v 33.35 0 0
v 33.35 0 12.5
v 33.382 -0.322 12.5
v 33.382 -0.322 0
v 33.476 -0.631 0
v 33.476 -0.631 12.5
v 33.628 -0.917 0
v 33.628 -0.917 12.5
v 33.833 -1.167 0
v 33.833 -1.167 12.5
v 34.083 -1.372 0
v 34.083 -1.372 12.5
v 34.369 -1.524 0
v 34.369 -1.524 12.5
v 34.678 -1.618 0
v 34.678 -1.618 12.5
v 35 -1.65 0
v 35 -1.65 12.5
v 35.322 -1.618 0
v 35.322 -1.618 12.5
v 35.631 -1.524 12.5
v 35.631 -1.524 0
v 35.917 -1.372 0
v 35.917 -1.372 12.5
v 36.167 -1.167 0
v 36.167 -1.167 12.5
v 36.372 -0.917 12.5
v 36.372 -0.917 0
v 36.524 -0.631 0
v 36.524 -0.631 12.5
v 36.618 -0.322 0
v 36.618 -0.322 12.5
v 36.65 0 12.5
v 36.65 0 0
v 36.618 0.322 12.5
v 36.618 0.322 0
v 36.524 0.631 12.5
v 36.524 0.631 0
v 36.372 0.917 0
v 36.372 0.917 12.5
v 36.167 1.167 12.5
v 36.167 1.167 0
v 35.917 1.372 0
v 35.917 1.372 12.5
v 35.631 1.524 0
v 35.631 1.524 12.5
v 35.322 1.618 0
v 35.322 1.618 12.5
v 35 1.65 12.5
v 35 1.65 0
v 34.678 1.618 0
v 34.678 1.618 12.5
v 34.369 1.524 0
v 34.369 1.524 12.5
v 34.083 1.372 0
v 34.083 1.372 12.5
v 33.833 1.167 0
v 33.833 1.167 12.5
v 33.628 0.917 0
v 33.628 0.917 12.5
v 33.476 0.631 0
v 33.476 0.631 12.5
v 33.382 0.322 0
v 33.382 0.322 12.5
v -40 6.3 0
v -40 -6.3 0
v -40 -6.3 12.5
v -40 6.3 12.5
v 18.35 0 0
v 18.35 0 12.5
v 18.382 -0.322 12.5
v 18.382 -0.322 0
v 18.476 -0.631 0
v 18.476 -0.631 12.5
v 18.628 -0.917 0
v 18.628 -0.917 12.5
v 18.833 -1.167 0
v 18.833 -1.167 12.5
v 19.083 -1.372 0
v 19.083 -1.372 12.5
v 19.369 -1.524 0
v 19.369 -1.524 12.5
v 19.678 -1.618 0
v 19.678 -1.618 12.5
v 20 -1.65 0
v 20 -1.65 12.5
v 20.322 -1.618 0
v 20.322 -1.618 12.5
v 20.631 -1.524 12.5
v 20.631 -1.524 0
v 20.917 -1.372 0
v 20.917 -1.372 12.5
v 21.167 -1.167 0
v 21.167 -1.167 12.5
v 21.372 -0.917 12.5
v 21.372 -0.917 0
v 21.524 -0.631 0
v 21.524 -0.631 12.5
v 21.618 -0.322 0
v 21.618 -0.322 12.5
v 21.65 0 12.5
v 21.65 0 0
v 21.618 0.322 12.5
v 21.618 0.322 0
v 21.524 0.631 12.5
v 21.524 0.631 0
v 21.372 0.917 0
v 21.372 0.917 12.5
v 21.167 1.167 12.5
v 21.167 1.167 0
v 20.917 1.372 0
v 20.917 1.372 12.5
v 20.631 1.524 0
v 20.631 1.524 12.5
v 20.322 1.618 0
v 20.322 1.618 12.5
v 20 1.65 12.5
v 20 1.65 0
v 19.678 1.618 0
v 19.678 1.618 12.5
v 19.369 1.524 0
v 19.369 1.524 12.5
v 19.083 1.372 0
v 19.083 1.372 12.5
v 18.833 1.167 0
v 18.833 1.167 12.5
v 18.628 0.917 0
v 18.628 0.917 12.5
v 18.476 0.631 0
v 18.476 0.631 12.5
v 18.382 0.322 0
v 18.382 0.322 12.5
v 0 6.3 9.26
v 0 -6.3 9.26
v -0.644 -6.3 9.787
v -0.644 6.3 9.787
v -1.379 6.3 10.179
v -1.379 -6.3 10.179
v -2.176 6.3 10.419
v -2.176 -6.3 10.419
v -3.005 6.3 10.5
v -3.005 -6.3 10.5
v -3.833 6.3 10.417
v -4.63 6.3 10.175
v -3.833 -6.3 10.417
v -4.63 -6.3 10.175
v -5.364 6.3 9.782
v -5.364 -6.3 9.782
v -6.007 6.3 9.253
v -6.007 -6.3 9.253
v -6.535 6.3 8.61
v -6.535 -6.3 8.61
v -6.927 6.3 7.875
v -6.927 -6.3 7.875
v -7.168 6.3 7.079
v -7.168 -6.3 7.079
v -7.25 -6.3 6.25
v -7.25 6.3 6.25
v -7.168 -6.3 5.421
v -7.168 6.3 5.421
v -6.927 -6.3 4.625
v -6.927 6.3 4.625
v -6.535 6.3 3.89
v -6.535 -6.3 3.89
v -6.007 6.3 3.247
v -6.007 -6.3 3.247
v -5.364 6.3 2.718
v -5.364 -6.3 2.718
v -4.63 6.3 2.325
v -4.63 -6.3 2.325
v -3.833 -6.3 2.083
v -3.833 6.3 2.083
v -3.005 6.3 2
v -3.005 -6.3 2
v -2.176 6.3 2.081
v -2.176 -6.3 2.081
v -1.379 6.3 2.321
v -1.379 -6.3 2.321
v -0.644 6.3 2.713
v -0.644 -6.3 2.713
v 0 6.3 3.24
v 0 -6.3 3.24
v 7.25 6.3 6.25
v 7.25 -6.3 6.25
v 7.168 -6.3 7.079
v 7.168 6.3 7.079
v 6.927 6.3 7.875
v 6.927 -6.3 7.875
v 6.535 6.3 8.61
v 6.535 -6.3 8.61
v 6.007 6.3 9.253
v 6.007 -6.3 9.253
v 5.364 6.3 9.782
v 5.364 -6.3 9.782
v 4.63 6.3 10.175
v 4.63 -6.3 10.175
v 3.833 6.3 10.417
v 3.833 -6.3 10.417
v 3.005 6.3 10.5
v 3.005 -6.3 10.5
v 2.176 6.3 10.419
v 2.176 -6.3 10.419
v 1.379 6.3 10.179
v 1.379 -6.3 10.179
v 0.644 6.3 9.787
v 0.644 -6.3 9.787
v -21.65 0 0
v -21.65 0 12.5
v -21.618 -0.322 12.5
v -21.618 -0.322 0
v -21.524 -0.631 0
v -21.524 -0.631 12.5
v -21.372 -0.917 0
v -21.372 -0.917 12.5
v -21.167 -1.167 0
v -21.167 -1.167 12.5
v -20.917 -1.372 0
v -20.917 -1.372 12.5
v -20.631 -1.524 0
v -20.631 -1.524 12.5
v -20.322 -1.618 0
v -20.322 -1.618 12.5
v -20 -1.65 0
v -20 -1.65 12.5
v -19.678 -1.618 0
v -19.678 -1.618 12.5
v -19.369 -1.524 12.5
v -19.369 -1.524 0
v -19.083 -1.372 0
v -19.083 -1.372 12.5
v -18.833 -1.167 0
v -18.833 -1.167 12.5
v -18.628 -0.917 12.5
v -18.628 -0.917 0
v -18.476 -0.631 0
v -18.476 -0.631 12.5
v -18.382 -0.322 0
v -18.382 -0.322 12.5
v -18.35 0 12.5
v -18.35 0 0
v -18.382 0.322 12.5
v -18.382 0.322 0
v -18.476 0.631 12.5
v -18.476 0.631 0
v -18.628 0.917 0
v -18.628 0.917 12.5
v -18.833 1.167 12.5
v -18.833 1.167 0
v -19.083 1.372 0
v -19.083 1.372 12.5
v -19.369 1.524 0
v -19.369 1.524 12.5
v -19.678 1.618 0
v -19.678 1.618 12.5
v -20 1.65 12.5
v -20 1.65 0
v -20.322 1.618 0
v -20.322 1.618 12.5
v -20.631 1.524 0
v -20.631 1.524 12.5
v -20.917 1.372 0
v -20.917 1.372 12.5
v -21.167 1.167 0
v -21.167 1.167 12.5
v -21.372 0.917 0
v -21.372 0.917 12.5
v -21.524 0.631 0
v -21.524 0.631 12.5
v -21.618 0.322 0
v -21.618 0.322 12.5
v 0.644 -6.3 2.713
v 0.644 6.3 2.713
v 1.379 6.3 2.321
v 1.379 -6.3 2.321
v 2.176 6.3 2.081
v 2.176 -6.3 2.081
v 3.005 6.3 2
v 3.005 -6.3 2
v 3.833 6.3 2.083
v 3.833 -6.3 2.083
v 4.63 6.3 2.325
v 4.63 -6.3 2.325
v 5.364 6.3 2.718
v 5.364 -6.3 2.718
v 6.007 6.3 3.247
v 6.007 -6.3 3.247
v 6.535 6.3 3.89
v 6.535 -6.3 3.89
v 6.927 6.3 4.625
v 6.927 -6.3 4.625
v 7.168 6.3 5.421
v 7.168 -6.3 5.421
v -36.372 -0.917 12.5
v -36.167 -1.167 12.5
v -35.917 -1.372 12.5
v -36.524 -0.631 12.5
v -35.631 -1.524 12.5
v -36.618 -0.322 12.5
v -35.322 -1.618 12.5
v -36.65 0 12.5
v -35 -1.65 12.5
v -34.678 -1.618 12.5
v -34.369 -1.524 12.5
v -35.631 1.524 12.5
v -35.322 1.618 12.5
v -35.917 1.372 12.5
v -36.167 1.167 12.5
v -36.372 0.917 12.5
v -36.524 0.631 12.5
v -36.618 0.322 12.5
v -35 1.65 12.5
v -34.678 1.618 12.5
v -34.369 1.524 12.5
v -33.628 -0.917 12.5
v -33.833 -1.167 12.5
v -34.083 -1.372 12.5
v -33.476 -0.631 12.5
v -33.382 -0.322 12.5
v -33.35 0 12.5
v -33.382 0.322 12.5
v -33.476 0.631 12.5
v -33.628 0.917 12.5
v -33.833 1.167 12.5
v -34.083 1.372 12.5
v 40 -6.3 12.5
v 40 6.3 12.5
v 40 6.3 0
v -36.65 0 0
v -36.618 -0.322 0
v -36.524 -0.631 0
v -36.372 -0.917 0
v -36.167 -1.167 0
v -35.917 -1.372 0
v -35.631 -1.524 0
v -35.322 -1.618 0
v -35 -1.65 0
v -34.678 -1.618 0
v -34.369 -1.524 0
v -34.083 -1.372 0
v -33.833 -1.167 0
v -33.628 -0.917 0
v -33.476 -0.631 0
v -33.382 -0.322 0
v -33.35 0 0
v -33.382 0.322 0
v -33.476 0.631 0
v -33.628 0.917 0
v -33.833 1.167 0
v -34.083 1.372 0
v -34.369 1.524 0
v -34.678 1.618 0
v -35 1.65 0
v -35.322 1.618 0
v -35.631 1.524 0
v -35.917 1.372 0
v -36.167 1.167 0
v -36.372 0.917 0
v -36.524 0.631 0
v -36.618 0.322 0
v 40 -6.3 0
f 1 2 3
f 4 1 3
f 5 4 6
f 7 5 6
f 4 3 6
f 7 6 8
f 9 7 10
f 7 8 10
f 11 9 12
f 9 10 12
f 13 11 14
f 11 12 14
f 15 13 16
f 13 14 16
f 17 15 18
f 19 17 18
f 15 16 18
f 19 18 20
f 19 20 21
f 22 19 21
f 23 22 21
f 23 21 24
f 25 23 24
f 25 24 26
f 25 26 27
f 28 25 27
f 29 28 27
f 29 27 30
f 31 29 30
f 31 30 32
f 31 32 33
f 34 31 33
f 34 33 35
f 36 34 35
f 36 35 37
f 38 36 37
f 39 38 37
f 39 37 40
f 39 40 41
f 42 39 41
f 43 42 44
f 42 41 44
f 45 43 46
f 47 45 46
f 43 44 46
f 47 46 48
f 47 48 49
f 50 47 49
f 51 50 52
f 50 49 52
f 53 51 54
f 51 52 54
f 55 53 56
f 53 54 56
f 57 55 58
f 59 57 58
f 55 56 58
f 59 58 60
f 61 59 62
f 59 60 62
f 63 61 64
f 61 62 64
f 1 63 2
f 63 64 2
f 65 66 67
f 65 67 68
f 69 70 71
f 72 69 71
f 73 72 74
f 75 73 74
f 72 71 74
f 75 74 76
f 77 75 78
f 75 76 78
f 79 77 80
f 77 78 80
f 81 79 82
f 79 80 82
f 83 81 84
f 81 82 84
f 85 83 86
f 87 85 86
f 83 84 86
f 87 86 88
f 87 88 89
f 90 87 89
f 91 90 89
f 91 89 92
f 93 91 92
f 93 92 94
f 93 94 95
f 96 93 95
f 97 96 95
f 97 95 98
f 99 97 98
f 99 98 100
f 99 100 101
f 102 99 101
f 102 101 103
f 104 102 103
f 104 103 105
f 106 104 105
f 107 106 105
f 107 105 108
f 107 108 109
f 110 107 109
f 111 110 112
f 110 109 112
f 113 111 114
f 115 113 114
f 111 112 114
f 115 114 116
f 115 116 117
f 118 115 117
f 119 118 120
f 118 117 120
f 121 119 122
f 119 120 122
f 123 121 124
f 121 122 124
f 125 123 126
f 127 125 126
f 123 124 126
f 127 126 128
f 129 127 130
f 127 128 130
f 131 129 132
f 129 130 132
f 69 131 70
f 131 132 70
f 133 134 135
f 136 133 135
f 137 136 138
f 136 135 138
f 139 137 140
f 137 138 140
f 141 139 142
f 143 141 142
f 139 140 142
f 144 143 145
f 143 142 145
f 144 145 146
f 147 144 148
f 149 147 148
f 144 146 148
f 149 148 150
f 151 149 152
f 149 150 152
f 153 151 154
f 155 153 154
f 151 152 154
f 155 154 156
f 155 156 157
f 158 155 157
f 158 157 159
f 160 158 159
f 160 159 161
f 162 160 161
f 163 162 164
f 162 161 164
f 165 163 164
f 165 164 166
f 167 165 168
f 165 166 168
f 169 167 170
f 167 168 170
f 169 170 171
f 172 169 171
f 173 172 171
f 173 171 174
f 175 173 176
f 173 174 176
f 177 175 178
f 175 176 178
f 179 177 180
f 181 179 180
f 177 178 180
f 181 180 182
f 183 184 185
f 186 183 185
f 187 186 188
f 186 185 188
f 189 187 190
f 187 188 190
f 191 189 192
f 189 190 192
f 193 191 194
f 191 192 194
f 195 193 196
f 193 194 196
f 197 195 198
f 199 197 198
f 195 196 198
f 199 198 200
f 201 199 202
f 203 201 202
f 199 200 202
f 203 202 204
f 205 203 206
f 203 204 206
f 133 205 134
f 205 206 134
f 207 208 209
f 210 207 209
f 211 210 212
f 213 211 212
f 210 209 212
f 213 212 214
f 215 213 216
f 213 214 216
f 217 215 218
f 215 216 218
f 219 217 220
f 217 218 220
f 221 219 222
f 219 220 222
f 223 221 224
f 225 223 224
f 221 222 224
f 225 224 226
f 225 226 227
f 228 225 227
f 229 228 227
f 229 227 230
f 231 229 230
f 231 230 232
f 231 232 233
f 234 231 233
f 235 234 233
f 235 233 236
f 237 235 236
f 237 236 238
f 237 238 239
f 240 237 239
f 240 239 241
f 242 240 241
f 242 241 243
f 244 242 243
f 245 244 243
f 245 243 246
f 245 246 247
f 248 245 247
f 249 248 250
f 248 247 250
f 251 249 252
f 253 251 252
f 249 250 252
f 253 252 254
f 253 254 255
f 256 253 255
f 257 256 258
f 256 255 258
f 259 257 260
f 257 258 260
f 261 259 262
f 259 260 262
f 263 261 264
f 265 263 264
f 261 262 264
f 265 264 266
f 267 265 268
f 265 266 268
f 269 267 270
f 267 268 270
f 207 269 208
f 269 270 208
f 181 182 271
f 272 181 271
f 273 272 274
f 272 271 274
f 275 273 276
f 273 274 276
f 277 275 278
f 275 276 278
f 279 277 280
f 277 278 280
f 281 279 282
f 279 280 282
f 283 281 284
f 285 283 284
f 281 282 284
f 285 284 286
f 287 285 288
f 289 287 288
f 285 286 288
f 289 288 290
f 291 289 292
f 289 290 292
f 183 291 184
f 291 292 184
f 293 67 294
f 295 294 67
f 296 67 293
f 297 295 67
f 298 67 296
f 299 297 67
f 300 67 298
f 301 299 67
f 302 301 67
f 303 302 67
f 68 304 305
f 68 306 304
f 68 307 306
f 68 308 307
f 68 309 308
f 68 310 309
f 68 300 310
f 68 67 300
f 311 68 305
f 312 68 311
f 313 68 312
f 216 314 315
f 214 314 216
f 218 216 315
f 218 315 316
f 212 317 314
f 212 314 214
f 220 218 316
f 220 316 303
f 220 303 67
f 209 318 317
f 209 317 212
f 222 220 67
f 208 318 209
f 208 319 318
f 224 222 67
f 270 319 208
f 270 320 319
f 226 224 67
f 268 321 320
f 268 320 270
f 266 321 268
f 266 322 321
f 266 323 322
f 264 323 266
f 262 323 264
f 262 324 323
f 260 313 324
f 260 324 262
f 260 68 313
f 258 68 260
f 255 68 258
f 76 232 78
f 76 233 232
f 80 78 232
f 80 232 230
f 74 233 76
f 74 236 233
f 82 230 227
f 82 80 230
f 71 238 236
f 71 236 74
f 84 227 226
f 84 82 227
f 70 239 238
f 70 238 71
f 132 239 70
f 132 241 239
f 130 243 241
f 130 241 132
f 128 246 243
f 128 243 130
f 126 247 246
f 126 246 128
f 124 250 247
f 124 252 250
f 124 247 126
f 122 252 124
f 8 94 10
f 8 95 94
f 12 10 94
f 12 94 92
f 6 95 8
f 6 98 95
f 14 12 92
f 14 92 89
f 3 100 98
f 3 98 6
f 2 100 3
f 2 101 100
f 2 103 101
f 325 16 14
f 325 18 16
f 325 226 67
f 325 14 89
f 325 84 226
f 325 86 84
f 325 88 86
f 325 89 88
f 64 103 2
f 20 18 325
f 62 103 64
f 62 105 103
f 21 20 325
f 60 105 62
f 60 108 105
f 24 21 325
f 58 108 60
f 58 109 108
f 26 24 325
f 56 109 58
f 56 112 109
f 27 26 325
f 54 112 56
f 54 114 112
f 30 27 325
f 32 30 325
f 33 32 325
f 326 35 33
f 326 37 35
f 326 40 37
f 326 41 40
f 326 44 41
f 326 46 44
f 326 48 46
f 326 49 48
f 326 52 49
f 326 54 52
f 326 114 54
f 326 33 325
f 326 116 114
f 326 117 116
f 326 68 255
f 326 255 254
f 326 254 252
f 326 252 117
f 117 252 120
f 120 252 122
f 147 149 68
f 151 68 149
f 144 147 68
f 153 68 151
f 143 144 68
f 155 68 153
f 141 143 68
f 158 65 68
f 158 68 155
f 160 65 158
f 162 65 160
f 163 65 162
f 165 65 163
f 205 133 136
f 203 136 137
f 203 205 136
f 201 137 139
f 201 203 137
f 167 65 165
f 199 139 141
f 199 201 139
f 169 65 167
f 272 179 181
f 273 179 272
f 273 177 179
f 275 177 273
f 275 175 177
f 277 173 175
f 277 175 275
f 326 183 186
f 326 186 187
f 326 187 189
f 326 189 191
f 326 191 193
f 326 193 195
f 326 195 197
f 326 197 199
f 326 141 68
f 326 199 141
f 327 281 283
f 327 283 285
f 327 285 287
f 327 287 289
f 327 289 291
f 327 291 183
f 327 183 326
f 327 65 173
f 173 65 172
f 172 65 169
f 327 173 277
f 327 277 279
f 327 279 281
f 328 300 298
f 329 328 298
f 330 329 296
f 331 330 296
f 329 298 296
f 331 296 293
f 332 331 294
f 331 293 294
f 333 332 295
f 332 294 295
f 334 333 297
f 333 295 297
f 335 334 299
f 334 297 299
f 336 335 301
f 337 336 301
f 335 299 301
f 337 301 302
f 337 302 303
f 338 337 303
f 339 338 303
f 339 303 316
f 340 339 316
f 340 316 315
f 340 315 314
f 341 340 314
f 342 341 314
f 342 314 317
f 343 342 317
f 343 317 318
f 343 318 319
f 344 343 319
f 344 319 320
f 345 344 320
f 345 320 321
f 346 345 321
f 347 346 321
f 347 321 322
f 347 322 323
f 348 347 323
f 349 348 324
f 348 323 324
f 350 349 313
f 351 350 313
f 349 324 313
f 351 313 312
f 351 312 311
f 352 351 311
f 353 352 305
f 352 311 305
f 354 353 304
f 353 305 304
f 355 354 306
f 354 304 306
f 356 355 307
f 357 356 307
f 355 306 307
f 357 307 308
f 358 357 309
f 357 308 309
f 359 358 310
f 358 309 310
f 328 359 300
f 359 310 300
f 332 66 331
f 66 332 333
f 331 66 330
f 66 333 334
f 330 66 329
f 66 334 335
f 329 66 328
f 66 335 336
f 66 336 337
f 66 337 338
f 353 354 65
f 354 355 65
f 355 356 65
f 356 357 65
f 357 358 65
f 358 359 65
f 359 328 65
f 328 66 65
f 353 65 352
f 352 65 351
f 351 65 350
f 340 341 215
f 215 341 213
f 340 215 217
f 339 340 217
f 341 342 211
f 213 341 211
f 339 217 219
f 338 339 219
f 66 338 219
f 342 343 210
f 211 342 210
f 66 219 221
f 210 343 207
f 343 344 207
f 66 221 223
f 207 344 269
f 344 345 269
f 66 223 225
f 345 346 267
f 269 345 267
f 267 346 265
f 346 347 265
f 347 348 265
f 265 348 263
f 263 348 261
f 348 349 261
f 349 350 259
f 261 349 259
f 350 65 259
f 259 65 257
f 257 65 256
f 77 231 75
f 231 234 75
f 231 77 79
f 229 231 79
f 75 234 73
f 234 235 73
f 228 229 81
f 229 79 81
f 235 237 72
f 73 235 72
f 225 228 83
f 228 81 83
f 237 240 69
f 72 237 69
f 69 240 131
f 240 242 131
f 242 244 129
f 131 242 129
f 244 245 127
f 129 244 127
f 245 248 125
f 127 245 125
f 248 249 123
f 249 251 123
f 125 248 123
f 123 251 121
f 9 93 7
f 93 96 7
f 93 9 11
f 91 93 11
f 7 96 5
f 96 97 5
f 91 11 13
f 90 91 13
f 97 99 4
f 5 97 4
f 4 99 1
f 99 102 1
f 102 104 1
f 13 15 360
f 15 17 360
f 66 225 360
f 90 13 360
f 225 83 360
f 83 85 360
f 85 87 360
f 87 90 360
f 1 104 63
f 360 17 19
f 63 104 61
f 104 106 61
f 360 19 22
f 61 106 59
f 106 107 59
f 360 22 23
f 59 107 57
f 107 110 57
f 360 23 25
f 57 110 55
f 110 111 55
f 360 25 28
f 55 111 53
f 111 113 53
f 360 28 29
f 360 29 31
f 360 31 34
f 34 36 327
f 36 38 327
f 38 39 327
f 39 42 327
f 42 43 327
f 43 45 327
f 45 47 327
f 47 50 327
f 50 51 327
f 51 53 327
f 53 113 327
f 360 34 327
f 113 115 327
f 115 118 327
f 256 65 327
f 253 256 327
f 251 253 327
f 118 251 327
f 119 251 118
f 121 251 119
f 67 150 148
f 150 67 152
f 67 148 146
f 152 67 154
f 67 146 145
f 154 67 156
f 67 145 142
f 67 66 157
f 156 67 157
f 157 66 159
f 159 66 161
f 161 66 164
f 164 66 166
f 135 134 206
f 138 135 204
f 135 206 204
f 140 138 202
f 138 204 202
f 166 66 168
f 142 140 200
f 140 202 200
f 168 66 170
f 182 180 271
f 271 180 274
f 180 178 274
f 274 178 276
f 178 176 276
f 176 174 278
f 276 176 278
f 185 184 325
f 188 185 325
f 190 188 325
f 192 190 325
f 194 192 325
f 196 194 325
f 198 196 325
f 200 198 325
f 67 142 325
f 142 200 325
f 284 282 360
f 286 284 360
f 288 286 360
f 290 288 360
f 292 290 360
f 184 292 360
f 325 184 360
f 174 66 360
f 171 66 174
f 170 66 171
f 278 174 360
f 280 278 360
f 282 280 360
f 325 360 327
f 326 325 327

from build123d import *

# Parameters (mm, degrees)
F0_W     = 80
F0_H     = 12.6
F1_DEPTH = 12.5
F3_DEPTH = 12.6
F4_D     = 3.3


with BuildPart() as f1:
    # F0 (on Top) → F1 (new body)
    with BuildSketch(Plane.XY):
        Rectangle(F0_W, F0_H)
    extrude(amount=F1_DEPTH)

    # F2 (on face) → F3 (cut, through all)
    with BuildSketch(Plane.XZ.offset(6.3)):
        with BuildLine():
            ThreePointArc((0, 3.2396013553), (4.6298006013, 2.324920383), (7.25, 6.25))
            ThreePointArc((7.25, 6.25), (4.6298006013, 10.175079617), (0, 9.2603986447))
            ThreePointArc((0, 9.2603986447), (0.925079617, 7.8798006013), (1.25, 6.25))
            ThreePointArc((1.25, 6.25), (0.925079617, 4.6201993987), (0, 3.2396013553))
        make_face()
        with BuildLine():
            ThreePointArc((1.25, 6.25), (0.925079617, 7.8798006013), (0, 9.2603986447))
            ThreePointArc((0, 9.2603986447), (-1.25, 6.25), (0, 3.2396013553))
            ThreePointArc((0, 3.2396013553), (0.925079617, 4.6201993987), (1.25, 6.25))
        make_face()
        with BuildLine():
            ThreePointArc((0, 3.2396013553), (-1.25, 6.25), (0, 9.2603986447))
            ThreePointArc((0, 9.2603986447), (-7.25, 6.25), (0, 3.2396013553))
        make_face()
    extrude(amount=-F3_DEPTH, mode=Mode.SUBTRACT)

    # F4 (through all)
    with Locations(Plane(origin=(0, 0, 0), x_dir=(1, 0, 0), z_dir=(0, 0, -1))):
        with Locations((-20, 0), (-35, 0), (20, 0), (35, 0)):
            Hole(F4_D / 2)


solid = f1.part
